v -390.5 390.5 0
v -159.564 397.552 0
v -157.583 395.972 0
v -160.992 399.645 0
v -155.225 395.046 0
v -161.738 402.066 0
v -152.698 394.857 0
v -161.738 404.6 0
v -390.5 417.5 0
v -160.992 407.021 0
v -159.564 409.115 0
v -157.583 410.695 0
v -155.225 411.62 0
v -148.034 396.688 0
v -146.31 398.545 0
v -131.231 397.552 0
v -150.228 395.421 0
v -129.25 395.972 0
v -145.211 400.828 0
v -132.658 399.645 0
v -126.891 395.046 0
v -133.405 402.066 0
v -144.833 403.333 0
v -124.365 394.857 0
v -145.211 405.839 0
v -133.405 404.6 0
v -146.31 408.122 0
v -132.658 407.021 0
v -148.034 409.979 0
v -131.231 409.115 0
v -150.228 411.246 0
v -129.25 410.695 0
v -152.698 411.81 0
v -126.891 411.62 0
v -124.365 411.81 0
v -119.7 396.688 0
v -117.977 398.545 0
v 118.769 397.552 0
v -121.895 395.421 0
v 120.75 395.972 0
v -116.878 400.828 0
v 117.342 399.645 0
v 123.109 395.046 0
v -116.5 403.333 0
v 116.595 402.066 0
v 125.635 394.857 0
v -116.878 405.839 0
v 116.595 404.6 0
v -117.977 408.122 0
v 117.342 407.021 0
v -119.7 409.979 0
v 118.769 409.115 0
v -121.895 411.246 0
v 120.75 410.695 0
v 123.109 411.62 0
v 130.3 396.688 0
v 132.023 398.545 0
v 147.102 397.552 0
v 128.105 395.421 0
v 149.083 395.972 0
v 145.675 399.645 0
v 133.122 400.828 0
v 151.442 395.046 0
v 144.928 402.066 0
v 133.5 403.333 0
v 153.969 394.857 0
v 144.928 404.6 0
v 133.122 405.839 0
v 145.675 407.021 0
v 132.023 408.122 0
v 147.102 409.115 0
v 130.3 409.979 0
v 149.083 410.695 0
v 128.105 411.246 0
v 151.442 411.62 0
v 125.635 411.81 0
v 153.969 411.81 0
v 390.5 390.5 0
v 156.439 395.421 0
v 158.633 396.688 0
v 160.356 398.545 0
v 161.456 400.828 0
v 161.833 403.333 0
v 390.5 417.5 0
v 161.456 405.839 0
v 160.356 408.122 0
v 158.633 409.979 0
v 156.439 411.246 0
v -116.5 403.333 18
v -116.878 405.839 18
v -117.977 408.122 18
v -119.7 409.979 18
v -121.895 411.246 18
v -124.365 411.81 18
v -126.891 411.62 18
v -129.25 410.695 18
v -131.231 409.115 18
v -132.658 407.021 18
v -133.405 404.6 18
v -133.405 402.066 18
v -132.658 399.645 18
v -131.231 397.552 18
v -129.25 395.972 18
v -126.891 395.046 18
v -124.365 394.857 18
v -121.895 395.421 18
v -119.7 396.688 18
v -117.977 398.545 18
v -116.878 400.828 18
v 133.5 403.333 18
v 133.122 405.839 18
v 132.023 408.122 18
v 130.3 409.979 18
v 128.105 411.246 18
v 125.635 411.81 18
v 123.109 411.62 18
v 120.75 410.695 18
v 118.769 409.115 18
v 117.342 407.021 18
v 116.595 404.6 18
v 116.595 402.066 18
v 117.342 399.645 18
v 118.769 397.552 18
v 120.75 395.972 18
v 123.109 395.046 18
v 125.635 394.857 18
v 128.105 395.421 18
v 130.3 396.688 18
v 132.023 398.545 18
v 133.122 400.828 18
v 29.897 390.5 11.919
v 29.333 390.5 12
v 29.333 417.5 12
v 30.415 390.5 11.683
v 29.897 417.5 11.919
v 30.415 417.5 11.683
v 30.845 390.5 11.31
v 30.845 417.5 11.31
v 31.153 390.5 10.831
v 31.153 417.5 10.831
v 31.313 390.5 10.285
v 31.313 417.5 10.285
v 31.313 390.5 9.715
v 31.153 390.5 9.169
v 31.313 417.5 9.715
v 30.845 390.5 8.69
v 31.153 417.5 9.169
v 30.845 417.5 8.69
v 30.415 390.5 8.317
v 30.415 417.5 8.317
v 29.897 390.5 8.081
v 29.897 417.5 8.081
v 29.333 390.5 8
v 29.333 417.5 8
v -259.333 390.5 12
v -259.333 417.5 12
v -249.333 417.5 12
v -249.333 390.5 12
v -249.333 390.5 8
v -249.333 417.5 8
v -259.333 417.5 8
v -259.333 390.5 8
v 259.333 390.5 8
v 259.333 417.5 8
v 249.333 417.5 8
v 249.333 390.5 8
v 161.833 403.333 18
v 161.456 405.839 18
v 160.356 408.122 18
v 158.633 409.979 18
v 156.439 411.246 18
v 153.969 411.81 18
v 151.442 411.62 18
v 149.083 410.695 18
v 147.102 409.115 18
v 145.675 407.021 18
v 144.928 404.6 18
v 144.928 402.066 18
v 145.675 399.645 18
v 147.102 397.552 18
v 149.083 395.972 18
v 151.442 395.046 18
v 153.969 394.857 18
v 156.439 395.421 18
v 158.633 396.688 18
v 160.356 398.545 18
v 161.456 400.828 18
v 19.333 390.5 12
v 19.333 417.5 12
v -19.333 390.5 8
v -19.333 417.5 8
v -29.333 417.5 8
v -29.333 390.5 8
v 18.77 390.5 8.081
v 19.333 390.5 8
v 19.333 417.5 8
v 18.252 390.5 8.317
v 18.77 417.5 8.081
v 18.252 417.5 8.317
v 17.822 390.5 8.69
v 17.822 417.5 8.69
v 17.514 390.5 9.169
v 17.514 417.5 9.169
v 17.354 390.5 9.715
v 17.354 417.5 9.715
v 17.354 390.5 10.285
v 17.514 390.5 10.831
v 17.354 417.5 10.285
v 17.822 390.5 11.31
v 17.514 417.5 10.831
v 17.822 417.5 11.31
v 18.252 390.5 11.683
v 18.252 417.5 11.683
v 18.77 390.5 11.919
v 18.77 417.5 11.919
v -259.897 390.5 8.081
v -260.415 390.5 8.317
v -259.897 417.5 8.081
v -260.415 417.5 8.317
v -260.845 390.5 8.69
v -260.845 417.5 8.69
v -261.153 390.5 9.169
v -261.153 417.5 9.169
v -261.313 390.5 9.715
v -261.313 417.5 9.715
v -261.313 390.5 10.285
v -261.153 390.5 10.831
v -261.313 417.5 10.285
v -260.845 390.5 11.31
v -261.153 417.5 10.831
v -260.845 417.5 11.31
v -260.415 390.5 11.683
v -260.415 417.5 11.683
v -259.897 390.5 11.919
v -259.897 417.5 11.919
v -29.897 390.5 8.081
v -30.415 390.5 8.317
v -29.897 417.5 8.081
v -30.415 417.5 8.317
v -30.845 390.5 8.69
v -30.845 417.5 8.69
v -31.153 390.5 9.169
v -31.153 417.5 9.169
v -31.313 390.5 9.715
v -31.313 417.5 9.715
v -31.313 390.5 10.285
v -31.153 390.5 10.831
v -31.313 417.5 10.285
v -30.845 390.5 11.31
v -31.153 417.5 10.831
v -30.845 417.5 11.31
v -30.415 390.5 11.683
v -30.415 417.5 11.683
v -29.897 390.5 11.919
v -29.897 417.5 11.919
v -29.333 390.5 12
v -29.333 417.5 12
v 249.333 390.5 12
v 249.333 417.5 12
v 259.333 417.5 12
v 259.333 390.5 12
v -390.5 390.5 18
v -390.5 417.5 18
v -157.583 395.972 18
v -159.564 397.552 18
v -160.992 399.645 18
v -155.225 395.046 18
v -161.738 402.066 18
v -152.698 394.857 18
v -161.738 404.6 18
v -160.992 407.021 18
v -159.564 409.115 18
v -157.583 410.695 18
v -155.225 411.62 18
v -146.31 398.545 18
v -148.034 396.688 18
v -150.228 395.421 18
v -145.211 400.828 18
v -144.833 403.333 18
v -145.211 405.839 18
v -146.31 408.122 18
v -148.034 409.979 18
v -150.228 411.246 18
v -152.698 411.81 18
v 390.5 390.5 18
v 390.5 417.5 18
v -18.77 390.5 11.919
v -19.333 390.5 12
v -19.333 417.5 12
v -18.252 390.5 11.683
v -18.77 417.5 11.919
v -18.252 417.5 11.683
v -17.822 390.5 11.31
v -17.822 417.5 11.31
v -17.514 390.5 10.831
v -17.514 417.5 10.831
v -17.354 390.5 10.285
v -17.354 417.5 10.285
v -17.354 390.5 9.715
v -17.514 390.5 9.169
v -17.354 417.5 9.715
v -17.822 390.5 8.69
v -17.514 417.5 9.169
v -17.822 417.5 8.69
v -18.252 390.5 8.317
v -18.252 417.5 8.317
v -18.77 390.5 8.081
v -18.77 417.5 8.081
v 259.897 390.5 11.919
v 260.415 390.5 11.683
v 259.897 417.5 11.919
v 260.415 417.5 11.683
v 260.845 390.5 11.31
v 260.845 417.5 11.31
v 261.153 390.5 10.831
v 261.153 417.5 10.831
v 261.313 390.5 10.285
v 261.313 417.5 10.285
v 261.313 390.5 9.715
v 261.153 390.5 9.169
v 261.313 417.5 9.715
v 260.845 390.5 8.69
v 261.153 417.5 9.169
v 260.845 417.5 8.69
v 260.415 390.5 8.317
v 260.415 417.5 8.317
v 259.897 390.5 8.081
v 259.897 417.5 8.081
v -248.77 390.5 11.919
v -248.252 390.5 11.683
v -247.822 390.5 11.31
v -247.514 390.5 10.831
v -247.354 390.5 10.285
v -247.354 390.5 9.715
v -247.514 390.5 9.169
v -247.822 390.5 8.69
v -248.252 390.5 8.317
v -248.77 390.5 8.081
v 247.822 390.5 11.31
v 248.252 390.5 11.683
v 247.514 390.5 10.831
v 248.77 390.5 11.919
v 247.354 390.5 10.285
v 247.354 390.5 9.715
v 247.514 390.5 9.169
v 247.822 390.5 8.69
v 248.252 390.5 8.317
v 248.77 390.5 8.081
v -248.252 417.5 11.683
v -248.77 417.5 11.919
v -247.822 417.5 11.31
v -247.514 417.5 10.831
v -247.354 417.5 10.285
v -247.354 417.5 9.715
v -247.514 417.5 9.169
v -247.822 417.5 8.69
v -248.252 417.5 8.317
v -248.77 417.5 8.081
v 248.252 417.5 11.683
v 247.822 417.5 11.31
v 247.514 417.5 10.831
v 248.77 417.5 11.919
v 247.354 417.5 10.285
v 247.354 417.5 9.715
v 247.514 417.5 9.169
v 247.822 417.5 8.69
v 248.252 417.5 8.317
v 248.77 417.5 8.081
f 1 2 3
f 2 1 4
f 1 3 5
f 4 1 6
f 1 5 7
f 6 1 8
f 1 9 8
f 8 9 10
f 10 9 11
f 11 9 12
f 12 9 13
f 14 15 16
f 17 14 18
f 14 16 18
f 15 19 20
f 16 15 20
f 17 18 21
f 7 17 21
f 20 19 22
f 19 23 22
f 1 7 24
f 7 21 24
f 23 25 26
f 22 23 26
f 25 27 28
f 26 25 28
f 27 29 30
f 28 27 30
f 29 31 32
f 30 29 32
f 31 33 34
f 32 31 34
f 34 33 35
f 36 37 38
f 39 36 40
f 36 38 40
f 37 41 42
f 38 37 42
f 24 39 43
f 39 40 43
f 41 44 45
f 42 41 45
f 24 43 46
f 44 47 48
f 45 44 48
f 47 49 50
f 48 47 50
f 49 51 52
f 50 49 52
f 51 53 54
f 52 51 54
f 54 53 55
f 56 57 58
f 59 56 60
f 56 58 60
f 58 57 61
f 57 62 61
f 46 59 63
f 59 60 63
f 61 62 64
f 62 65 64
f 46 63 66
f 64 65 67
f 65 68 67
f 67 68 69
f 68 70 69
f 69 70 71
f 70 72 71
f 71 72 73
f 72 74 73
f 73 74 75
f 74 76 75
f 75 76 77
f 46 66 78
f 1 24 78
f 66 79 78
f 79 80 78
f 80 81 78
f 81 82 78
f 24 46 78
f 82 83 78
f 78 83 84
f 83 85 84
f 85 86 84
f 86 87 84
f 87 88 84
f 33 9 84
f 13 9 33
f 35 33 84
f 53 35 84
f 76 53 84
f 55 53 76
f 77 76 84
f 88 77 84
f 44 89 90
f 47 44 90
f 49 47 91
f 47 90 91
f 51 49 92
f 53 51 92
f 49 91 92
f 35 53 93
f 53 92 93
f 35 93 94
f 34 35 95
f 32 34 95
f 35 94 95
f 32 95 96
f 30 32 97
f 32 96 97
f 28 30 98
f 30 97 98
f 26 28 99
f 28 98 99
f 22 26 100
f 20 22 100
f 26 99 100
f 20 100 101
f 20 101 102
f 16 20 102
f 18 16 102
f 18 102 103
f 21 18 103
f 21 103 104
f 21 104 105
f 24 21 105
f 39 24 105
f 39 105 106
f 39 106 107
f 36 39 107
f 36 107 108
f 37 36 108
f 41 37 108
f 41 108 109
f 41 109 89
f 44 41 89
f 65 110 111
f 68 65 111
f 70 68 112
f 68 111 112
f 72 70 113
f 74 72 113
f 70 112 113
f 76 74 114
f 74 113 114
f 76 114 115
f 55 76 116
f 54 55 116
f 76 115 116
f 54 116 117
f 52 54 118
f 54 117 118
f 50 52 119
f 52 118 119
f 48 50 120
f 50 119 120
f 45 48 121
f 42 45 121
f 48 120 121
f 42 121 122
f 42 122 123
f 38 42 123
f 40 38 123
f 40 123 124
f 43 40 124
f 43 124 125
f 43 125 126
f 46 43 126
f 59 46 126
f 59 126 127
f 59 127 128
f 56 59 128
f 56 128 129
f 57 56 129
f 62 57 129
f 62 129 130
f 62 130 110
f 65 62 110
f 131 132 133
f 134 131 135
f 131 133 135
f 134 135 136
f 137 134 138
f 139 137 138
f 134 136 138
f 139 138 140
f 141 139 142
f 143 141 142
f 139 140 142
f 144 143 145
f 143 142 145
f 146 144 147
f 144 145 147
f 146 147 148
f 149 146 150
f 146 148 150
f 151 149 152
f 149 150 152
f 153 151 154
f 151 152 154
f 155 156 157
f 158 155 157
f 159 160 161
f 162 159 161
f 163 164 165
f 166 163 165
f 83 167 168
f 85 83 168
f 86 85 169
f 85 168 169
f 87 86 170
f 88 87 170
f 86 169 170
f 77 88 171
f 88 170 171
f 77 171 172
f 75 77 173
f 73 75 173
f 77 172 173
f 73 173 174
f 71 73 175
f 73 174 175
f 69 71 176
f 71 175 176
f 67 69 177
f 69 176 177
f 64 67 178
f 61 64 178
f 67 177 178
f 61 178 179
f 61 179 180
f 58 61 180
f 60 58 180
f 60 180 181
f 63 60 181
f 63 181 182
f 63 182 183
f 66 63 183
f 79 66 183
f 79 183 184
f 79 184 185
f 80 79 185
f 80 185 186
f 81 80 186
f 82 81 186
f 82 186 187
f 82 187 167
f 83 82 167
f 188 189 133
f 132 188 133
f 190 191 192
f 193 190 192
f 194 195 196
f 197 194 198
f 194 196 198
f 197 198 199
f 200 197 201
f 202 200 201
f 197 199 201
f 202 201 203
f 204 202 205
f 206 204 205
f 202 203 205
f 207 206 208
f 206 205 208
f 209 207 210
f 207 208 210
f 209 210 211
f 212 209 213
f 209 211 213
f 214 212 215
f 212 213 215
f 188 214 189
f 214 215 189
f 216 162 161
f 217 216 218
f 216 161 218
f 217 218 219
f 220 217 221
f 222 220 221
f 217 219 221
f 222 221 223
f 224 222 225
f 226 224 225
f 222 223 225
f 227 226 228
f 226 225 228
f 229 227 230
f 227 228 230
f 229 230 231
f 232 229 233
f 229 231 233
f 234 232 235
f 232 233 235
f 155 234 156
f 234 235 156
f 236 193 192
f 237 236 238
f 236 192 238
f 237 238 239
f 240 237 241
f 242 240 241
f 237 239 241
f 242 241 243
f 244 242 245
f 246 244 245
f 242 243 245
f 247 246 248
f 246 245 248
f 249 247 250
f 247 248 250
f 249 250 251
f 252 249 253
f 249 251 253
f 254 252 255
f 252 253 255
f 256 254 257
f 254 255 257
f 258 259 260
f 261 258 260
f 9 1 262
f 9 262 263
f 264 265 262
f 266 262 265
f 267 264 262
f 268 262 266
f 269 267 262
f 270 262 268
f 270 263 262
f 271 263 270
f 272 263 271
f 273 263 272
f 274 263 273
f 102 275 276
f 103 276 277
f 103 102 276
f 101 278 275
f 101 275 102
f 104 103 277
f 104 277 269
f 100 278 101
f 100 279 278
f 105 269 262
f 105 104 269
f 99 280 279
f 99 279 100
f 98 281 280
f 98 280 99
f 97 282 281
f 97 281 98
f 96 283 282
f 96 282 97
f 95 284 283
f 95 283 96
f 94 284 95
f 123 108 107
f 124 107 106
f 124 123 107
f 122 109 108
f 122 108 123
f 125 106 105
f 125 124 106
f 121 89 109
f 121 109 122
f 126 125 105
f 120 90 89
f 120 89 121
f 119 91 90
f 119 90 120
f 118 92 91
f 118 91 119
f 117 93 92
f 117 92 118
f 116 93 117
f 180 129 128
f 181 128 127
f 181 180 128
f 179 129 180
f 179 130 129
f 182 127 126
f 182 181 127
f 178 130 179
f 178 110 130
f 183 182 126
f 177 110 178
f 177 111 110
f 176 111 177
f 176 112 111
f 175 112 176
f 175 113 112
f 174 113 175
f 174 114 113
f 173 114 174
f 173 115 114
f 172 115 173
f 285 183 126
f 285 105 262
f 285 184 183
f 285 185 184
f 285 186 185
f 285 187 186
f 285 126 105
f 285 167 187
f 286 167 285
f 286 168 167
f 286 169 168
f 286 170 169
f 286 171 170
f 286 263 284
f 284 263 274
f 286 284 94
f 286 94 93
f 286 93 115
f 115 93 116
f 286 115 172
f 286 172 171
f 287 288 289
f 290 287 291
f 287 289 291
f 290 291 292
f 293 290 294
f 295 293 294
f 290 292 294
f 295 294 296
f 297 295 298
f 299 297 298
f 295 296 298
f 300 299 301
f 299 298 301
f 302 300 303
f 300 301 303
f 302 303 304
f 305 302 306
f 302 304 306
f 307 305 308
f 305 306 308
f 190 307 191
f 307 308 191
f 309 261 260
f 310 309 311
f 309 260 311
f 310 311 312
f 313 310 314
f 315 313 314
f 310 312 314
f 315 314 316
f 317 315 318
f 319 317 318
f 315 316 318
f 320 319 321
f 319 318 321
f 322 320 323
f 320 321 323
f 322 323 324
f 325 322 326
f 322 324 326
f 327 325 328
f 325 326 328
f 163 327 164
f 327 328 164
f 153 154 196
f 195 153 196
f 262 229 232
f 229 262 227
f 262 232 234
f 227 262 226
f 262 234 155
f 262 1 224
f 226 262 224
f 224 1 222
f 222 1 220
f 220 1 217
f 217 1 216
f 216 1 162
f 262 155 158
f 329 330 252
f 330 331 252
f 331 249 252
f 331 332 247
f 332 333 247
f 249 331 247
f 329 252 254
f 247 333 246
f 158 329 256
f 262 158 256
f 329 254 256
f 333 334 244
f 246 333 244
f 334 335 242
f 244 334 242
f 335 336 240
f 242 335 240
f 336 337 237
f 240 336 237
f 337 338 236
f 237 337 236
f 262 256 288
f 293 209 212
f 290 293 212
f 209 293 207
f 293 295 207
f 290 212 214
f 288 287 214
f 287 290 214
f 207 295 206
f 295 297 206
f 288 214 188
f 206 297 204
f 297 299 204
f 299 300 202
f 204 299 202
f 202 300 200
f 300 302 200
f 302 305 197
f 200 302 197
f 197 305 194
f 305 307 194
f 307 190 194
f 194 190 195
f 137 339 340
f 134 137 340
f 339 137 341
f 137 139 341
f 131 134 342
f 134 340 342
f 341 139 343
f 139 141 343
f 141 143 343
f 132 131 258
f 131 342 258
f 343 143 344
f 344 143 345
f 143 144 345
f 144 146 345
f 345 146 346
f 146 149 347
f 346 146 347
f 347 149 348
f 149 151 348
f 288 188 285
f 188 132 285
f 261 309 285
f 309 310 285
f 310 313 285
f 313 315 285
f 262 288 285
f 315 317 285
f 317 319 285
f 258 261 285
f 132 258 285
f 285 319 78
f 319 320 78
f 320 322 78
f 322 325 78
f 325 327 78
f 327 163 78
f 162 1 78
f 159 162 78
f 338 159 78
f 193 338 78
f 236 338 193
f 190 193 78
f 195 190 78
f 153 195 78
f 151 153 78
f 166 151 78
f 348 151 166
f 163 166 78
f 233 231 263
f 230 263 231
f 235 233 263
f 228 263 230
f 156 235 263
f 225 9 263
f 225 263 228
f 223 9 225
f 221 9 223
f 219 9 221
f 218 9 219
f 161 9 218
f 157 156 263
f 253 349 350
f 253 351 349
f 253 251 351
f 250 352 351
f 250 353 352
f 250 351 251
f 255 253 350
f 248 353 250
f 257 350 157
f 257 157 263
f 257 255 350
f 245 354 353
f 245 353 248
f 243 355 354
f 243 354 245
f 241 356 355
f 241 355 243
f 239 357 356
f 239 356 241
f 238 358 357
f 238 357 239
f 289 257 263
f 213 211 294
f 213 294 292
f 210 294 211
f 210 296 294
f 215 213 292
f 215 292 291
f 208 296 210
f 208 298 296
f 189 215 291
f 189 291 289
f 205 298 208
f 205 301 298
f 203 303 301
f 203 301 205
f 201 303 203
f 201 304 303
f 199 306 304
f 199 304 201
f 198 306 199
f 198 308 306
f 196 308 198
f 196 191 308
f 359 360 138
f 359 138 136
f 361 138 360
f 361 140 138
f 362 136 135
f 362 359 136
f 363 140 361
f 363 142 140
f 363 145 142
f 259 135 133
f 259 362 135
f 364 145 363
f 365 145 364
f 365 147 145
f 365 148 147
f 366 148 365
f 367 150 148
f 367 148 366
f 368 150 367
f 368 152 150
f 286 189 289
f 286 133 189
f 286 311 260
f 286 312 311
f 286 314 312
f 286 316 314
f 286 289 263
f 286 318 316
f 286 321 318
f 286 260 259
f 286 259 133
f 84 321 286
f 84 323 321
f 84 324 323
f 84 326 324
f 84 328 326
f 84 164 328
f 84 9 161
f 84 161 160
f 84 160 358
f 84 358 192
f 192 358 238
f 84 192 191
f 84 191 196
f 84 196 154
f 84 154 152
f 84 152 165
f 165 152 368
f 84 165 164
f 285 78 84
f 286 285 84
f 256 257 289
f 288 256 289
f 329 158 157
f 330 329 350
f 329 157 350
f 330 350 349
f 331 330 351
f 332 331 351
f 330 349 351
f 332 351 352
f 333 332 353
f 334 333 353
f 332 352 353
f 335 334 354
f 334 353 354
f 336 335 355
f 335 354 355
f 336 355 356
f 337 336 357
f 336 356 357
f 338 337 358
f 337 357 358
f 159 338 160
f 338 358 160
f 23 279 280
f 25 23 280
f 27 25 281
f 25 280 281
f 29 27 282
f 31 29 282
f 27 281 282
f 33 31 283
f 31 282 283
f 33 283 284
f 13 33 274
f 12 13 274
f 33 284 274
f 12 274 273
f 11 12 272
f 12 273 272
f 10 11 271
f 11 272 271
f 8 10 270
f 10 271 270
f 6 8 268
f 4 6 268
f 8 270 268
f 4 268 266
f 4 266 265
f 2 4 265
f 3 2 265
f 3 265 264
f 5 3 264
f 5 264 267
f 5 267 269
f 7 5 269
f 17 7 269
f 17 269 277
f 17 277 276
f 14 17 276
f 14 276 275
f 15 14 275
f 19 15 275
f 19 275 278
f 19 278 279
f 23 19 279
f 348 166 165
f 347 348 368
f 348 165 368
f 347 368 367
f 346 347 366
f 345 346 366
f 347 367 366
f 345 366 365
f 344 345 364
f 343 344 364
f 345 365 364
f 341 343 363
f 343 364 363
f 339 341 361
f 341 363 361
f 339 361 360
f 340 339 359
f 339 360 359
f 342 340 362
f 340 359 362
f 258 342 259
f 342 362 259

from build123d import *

# Parameters (mm, degrees)
SKETCH031_W          = 781
SKETCH031_H          = 27
PAD022_DEPTH         = 18
POCKET014_DEPTH      = 27.001
POCKET014_DEPTH_BACK = 0.001
SKETCH037_R          = 8.5
POCKET017_DEPTH      = 18.001
POCKET017_DEPTH_BACK = 0.001


with BuildPart() as part:
    # Sketch031 → Pad022 (new body)
    with BuildSketch(Plane.XY):
        Rectangle(SKETCH031_W, SKETCH031_H)
    extrude(amount=PAD022_DEPTH)

    # Sketch033 (on Face1 of Pad022) → Pocket014 (cut, two sides)
    with BuildSketch(Plane(origin=(0, 13.5, 0), x_dir=(-1, 0, 0), z_dir=(0, 1, 0))) as pocket014_sk:
        with BuildLine():
            ThreePointArc((-259.333333, 12), (-261.333333, 10), (-259.333333, 8))
            Line((-259.333333, 8), (-249.333333, 8))
            ThreePointArc((-249.333333, 8), (-247.333333, 10), (-249.333333, 12))
            Line((-249.333333, 12), (-259.333333, 12))
        make_face()
        with BuildLine():
            ThreePointArc((-29.333333, 12), (-31.333333, 10), (-29.333333, 8))
            Line((-29.333333, 8), (-19.333333, 8))
            ThreePointArc((-19.333333, 8), (-17.333333, 10), (-19.333333, 12))
            Line((-19.333333, 12), (-29.333333, 12))
        make_face()
        with BuildLine():
            ThreePointArc((19.333333, 12), (17.333333, 10), (19.333333, 8))
            Line((19.333333, 8), (29.333333, 8))
            ThreePointArc((29.333333, 8), (31.333333, 10), (29.333333, 12))
            Line((29.333333, 12), (19.333333, 12))
        make_face()
        with BuildLine():
            ThreePointArc((249.333333, 12), (247.333333, 10), (249.333333, 8))
            Line((249.333333, 8), (259.333333, 8))
            ThreePointArc((259.333333, 8), (261.333333, 10), (259.333333, 12))
            Line((259.333333, 12), (249.333333, 12))
        make_face()
    extrude(amount=-POCKET014_DEPTH, mode=Mode.SUBTRACT)
    extrude(pocket014_sk.sketch, amount=POCKET014_DEPTH_BACK, mode=Mode.SUBTRACT)

    # Sketch037 (on Face4 of Pocket014) → Pocket017 (cut, two sides)
    with BuildSketch(Plane.XY.offset(18)) as pocket017_sk:
        with Locations((-153.333333, -0.666667)):
            Circle(SKETCH037_R)
        with Locations((-125, -0.666667)):
            Circle(SKETCH037_R)
        with Locations((125, -0.666667)):
            Circle(SKETCH037_R)
        with Locations((153.333333, -0.666667)):
            Circle(SKETCH037_R)
    extrude(amount=-POCKET017_DEPTH, mode=Mode.SUBTRACT)
    extrude(pocket017_sk.sketch, amount=POCKET017_DEPTH_BACK, mode=Mode.SUBTRACT)


with BuildPart() as part_1:
    # Body022 placement: moved
    add(part.part.moved(Location((0, 404, 0))))


solid = part_1.part
